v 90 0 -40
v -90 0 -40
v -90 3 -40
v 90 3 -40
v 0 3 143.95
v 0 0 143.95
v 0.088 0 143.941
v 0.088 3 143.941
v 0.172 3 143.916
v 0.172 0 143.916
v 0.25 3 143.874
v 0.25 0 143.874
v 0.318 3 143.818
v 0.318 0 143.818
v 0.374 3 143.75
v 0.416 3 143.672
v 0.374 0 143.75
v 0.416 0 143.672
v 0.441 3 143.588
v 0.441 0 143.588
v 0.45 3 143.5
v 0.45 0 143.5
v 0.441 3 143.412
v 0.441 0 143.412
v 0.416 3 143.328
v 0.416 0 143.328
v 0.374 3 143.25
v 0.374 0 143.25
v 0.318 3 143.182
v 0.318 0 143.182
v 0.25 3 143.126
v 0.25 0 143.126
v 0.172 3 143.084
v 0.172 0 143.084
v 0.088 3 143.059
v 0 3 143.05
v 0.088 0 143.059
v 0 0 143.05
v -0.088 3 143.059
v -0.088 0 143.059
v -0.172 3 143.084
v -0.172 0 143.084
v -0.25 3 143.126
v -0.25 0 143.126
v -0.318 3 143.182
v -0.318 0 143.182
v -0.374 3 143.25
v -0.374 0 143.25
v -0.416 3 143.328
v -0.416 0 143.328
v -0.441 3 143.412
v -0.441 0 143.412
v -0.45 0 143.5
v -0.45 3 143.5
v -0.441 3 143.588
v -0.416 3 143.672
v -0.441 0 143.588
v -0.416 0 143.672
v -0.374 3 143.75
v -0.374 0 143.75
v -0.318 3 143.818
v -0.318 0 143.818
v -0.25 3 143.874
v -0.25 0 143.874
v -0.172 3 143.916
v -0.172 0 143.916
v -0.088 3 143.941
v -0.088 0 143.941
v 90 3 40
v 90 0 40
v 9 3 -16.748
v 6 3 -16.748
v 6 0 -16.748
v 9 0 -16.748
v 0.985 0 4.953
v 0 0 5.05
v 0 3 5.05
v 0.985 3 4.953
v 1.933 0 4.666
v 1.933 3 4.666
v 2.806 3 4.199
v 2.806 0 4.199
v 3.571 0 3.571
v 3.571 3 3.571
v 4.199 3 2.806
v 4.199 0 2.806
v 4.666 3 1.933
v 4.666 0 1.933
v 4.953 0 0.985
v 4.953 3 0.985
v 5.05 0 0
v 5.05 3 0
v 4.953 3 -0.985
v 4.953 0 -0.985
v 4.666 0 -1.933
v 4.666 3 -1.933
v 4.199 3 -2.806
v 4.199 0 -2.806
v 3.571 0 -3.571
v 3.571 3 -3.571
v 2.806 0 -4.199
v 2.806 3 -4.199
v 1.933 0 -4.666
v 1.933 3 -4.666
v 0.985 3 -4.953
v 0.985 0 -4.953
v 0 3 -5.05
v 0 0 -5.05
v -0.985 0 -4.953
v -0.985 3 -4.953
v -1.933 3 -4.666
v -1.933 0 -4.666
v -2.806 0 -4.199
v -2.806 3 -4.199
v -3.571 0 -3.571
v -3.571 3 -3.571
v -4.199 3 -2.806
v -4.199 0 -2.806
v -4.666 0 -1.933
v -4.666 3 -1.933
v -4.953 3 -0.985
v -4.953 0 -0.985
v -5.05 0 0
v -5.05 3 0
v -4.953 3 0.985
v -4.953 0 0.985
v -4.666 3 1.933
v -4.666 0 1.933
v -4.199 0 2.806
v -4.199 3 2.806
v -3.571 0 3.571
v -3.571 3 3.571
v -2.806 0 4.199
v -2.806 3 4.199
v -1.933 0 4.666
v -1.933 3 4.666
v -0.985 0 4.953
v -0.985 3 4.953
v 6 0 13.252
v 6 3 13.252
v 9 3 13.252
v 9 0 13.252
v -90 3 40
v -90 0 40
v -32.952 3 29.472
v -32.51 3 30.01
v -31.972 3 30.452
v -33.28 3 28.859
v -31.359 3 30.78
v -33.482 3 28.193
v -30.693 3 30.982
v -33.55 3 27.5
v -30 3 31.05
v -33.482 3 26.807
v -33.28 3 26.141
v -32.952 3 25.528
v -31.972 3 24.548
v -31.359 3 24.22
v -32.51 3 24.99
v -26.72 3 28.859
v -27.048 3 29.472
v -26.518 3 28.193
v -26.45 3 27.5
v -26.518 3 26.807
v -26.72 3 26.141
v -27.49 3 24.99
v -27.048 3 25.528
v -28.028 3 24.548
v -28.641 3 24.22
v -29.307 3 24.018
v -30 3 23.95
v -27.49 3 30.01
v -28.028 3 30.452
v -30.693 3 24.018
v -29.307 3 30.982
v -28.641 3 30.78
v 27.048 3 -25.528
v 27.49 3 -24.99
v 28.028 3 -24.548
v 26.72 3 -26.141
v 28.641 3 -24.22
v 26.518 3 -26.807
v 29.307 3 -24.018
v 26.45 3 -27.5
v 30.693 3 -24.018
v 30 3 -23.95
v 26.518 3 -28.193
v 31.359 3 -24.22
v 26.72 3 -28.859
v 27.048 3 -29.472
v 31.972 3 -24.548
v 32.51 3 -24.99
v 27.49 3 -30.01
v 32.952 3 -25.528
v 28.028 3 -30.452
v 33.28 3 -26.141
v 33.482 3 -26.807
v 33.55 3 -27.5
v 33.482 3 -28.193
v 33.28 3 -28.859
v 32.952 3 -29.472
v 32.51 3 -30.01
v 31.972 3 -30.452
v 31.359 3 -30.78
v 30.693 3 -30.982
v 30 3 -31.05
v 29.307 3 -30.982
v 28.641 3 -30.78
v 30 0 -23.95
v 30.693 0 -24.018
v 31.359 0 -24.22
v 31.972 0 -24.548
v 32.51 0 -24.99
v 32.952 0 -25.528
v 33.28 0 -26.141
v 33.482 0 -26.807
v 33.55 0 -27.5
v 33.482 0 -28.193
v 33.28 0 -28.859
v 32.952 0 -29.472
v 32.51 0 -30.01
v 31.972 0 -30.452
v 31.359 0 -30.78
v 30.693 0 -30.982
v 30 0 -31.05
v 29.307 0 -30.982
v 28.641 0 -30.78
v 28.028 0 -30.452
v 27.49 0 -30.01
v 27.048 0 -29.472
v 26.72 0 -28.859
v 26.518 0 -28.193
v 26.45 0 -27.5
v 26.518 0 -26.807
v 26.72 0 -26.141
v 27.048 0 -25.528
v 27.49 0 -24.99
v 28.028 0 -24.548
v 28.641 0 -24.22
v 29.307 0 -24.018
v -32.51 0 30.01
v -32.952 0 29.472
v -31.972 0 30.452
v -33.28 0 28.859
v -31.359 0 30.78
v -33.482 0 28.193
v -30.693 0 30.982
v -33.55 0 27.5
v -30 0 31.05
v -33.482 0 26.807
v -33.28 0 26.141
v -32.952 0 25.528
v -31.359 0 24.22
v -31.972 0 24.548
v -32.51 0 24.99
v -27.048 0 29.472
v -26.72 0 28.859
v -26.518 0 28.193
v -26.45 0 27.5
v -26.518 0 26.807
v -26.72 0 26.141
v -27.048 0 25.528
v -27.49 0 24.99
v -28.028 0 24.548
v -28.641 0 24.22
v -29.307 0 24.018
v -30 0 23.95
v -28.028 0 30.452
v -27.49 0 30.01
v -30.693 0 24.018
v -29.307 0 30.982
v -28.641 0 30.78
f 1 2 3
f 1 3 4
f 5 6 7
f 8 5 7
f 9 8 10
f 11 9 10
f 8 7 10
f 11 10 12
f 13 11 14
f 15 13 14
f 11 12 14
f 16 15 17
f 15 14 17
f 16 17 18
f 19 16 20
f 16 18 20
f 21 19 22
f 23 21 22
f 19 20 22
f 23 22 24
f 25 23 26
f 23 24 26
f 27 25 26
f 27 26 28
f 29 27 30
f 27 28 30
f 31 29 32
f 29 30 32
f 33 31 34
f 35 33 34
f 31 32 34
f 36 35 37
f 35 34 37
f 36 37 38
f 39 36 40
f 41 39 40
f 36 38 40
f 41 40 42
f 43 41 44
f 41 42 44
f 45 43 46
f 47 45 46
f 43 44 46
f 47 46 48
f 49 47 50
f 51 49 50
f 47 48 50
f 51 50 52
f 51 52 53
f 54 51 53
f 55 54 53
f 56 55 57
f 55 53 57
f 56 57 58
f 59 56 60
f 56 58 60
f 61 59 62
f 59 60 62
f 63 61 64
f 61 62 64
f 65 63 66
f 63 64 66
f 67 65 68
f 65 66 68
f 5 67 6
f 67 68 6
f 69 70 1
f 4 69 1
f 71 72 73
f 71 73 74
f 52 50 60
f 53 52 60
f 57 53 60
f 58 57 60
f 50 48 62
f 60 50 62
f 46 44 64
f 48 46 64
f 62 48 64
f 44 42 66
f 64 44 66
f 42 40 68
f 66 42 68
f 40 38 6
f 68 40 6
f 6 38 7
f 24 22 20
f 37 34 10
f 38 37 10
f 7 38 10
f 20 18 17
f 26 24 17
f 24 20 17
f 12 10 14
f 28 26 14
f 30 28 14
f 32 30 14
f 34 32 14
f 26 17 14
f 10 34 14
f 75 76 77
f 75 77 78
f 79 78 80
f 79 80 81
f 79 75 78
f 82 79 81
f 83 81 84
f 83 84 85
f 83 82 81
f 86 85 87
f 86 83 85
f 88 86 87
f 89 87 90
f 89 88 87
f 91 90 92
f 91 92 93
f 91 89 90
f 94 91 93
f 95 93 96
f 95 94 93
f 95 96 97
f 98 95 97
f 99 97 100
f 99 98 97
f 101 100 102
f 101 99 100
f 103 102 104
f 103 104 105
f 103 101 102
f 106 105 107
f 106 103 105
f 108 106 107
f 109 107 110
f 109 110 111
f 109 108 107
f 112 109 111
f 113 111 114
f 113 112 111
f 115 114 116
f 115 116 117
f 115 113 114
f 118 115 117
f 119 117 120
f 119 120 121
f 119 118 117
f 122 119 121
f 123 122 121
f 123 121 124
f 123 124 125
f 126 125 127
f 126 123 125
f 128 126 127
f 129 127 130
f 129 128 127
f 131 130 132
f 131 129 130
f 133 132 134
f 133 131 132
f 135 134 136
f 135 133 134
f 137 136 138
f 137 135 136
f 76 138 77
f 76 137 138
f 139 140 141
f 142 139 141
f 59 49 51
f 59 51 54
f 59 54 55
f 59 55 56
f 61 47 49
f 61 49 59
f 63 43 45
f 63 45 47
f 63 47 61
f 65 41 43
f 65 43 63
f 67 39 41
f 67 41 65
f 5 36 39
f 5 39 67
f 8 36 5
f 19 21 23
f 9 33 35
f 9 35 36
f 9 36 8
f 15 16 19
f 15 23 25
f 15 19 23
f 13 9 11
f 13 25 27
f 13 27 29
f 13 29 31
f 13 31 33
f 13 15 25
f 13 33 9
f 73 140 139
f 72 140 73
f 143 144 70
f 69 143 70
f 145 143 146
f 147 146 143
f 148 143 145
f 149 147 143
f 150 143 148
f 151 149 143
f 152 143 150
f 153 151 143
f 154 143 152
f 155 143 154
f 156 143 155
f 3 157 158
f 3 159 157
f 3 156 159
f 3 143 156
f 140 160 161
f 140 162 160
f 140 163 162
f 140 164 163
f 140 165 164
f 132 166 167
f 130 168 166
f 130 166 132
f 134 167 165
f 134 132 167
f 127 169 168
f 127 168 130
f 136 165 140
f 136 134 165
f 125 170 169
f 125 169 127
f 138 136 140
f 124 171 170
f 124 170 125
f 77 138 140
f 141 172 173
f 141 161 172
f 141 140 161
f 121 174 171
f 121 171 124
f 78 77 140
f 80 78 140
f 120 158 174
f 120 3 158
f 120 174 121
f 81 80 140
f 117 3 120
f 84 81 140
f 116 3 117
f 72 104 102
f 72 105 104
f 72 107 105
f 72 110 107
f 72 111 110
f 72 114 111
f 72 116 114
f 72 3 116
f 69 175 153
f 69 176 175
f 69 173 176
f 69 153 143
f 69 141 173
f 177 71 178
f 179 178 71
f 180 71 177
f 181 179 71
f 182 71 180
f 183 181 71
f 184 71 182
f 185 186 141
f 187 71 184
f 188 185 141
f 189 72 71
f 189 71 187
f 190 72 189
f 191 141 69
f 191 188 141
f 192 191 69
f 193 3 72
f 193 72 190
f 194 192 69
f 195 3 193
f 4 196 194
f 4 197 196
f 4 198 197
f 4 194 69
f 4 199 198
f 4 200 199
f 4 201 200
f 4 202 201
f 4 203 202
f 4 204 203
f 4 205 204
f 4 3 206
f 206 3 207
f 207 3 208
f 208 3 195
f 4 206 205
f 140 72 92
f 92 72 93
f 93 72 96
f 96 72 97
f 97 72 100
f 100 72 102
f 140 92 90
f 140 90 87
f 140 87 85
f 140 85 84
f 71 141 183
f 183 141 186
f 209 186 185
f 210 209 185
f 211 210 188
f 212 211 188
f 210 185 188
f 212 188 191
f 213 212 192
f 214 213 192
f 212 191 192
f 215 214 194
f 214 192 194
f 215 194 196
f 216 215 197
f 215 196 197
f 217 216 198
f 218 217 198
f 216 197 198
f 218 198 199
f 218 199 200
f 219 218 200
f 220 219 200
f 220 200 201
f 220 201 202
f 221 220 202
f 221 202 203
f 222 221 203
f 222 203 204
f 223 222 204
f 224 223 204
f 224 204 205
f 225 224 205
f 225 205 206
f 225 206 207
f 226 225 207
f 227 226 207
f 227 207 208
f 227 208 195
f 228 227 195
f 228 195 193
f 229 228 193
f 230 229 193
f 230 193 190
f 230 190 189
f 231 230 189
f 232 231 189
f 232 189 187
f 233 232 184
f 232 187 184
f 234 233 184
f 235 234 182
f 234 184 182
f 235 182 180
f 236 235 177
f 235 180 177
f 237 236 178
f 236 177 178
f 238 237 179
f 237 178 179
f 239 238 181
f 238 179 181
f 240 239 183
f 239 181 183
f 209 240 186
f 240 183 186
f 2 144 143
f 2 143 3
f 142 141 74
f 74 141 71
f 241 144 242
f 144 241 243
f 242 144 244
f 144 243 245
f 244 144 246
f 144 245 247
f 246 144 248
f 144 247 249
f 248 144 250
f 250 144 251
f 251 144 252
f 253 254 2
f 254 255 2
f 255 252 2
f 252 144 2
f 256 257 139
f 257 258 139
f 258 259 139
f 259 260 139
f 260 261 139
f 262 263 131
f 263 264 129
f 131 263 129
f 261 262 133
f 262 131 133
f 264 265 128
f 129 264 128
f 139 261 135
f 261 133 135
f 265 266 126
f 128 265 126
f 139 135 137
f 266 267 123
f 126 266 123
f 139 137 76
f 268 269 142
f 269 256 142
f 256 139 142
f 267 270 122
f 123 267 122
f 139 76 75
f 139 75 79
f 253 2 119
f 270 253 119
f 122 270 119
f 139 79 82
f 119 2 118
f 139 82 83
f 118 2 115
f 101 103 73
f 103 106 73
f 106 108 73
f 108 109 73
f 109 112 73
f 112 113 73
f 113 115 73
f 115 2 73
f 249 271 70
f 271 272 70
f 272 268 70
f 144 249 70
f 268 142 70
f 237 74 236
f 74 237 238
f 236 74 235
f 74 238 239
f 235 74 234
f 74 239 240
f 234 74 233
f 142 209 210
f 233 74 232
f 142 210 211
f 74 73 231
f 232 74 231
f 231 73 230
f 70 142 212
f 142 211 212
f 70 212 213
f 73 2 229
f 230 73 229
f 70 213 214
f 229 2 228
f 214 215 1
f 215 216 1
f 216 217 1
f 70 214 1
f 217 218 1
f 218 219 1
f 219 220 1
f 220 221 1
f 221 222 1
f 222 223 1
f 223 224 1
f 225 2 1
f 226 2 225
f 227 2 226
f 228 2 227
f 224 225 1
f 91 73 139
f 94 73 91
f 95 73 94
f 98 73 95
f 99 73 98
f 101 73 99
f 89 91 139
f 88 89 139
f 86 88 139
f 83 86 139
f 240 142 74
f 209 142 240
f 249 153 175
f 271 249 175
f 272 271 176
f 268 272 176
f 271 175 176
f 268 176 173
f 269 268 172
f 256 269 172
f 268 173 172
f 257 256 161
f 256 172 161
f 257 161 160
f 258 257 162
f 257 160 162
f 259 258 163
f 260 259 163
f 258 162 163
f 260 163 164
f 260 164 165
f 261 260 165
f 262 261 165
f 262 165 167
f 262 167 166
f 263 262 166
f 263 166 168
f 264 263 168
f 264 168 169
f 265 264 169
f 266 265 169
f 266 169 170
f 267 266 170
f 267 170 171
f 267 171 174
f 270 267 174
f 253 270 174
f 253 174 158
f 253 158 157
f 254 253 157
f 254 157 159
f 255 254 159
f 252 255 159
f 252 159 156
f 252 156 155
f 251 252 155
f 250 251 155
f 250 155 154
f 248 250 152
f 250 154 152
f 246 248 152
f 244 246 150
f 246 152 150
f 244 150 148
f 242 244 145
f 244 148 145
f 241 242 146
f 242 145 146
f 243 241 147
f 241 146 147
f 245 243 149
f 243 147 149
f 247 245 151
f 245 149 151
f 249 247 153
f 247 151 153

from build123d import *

# Parameters (mm, degrees)
ESBO_O1_R                  = 0.45
RESSALTO_EXTRUS_O1_DEPTH   = 3
ESBO_O1_W                  = 180
ESBO_O1_H                  = 80
ESBO_O1_R_2                = 5.05
RESSALTO_EXTRUS_O1_2_DEPTH = 3
ESBO_O3_R                  = 3.55
CORTE_EXTRUS_O2_DEPTH      = 100
ESBO_O4_W                  = 3
ESBO_O4_H                  = 30
CORTE_EXTRUS_O3_DEPTH      = 10


with BuildPart() as part:
    # Esboço1 → Ressalto-extrusão1 (new body)
    with BuildSketch(Plane(origin=(0, 0, 0), x_dir=(1, 0, 0), z_dir=(0, 1, 0))):
        with Locations(Location((0, -143.5, 0), (0, 0, 270))):
            Circle(ESBO_O1_R)
    extrude(amount=RESSALTO_EXTRUS_O1_DEPTH)


with BuildPart() as body_2:
    # Esboço1 → Ressalto-extrus_o1 2 (new body)
    with BuildSketch(Plane(origin=(0, 0, 0), x_dir=(1, 0, 0), z_dir=(0, 1, 0))):
        Rectangle(ESBO_O1_W, ESBO_O1_H)
        with Locations(Location((0, 0, 0), (0, 0, 270))):
            Circle(ESBO_O1_R_2, mode=Mode.SUBTRACT)
    extrude(amount=RESSALTO_EXTRUS_O1_2_DEPTH)

    # Esboço3 → Corte-extrusão2 (cut)
    with BuildSketch(Plane(origin=(0, 3, 0), x_dir=(1, 0, 0), z_dir=(0, 1, 0))):
        with Locations(Location((30, 27.5, 0), (0, 0, 270))):
            Circle(ESBO_O3_R)
        with Locations(Location((-30, -27.5, 0), (0, 0, 270))):
            Circle(ESBO_O3_R)
    extrude(amount=-CORTE_EXTRUS_O2_DEPTH, mode=Mode.SUBTRACT)

    # Esboço4 → Corte-extrusão3 (cut)
    with BuildSketch(Plane(origin=(0, 3, 0), x_dir=(1, 0, 0), z_dir=(0, 1, 0))):
        with Locations((7.5, 1.748092336)):
            Rectangle(ESBO_O4_W, ESBO_O4_H)
    extrude(amount=-CORTE_EXTRUS_O3_DEPTH, mode=Mode.SUBTRACT)


solid = Compound([part.part, body_2.part])
